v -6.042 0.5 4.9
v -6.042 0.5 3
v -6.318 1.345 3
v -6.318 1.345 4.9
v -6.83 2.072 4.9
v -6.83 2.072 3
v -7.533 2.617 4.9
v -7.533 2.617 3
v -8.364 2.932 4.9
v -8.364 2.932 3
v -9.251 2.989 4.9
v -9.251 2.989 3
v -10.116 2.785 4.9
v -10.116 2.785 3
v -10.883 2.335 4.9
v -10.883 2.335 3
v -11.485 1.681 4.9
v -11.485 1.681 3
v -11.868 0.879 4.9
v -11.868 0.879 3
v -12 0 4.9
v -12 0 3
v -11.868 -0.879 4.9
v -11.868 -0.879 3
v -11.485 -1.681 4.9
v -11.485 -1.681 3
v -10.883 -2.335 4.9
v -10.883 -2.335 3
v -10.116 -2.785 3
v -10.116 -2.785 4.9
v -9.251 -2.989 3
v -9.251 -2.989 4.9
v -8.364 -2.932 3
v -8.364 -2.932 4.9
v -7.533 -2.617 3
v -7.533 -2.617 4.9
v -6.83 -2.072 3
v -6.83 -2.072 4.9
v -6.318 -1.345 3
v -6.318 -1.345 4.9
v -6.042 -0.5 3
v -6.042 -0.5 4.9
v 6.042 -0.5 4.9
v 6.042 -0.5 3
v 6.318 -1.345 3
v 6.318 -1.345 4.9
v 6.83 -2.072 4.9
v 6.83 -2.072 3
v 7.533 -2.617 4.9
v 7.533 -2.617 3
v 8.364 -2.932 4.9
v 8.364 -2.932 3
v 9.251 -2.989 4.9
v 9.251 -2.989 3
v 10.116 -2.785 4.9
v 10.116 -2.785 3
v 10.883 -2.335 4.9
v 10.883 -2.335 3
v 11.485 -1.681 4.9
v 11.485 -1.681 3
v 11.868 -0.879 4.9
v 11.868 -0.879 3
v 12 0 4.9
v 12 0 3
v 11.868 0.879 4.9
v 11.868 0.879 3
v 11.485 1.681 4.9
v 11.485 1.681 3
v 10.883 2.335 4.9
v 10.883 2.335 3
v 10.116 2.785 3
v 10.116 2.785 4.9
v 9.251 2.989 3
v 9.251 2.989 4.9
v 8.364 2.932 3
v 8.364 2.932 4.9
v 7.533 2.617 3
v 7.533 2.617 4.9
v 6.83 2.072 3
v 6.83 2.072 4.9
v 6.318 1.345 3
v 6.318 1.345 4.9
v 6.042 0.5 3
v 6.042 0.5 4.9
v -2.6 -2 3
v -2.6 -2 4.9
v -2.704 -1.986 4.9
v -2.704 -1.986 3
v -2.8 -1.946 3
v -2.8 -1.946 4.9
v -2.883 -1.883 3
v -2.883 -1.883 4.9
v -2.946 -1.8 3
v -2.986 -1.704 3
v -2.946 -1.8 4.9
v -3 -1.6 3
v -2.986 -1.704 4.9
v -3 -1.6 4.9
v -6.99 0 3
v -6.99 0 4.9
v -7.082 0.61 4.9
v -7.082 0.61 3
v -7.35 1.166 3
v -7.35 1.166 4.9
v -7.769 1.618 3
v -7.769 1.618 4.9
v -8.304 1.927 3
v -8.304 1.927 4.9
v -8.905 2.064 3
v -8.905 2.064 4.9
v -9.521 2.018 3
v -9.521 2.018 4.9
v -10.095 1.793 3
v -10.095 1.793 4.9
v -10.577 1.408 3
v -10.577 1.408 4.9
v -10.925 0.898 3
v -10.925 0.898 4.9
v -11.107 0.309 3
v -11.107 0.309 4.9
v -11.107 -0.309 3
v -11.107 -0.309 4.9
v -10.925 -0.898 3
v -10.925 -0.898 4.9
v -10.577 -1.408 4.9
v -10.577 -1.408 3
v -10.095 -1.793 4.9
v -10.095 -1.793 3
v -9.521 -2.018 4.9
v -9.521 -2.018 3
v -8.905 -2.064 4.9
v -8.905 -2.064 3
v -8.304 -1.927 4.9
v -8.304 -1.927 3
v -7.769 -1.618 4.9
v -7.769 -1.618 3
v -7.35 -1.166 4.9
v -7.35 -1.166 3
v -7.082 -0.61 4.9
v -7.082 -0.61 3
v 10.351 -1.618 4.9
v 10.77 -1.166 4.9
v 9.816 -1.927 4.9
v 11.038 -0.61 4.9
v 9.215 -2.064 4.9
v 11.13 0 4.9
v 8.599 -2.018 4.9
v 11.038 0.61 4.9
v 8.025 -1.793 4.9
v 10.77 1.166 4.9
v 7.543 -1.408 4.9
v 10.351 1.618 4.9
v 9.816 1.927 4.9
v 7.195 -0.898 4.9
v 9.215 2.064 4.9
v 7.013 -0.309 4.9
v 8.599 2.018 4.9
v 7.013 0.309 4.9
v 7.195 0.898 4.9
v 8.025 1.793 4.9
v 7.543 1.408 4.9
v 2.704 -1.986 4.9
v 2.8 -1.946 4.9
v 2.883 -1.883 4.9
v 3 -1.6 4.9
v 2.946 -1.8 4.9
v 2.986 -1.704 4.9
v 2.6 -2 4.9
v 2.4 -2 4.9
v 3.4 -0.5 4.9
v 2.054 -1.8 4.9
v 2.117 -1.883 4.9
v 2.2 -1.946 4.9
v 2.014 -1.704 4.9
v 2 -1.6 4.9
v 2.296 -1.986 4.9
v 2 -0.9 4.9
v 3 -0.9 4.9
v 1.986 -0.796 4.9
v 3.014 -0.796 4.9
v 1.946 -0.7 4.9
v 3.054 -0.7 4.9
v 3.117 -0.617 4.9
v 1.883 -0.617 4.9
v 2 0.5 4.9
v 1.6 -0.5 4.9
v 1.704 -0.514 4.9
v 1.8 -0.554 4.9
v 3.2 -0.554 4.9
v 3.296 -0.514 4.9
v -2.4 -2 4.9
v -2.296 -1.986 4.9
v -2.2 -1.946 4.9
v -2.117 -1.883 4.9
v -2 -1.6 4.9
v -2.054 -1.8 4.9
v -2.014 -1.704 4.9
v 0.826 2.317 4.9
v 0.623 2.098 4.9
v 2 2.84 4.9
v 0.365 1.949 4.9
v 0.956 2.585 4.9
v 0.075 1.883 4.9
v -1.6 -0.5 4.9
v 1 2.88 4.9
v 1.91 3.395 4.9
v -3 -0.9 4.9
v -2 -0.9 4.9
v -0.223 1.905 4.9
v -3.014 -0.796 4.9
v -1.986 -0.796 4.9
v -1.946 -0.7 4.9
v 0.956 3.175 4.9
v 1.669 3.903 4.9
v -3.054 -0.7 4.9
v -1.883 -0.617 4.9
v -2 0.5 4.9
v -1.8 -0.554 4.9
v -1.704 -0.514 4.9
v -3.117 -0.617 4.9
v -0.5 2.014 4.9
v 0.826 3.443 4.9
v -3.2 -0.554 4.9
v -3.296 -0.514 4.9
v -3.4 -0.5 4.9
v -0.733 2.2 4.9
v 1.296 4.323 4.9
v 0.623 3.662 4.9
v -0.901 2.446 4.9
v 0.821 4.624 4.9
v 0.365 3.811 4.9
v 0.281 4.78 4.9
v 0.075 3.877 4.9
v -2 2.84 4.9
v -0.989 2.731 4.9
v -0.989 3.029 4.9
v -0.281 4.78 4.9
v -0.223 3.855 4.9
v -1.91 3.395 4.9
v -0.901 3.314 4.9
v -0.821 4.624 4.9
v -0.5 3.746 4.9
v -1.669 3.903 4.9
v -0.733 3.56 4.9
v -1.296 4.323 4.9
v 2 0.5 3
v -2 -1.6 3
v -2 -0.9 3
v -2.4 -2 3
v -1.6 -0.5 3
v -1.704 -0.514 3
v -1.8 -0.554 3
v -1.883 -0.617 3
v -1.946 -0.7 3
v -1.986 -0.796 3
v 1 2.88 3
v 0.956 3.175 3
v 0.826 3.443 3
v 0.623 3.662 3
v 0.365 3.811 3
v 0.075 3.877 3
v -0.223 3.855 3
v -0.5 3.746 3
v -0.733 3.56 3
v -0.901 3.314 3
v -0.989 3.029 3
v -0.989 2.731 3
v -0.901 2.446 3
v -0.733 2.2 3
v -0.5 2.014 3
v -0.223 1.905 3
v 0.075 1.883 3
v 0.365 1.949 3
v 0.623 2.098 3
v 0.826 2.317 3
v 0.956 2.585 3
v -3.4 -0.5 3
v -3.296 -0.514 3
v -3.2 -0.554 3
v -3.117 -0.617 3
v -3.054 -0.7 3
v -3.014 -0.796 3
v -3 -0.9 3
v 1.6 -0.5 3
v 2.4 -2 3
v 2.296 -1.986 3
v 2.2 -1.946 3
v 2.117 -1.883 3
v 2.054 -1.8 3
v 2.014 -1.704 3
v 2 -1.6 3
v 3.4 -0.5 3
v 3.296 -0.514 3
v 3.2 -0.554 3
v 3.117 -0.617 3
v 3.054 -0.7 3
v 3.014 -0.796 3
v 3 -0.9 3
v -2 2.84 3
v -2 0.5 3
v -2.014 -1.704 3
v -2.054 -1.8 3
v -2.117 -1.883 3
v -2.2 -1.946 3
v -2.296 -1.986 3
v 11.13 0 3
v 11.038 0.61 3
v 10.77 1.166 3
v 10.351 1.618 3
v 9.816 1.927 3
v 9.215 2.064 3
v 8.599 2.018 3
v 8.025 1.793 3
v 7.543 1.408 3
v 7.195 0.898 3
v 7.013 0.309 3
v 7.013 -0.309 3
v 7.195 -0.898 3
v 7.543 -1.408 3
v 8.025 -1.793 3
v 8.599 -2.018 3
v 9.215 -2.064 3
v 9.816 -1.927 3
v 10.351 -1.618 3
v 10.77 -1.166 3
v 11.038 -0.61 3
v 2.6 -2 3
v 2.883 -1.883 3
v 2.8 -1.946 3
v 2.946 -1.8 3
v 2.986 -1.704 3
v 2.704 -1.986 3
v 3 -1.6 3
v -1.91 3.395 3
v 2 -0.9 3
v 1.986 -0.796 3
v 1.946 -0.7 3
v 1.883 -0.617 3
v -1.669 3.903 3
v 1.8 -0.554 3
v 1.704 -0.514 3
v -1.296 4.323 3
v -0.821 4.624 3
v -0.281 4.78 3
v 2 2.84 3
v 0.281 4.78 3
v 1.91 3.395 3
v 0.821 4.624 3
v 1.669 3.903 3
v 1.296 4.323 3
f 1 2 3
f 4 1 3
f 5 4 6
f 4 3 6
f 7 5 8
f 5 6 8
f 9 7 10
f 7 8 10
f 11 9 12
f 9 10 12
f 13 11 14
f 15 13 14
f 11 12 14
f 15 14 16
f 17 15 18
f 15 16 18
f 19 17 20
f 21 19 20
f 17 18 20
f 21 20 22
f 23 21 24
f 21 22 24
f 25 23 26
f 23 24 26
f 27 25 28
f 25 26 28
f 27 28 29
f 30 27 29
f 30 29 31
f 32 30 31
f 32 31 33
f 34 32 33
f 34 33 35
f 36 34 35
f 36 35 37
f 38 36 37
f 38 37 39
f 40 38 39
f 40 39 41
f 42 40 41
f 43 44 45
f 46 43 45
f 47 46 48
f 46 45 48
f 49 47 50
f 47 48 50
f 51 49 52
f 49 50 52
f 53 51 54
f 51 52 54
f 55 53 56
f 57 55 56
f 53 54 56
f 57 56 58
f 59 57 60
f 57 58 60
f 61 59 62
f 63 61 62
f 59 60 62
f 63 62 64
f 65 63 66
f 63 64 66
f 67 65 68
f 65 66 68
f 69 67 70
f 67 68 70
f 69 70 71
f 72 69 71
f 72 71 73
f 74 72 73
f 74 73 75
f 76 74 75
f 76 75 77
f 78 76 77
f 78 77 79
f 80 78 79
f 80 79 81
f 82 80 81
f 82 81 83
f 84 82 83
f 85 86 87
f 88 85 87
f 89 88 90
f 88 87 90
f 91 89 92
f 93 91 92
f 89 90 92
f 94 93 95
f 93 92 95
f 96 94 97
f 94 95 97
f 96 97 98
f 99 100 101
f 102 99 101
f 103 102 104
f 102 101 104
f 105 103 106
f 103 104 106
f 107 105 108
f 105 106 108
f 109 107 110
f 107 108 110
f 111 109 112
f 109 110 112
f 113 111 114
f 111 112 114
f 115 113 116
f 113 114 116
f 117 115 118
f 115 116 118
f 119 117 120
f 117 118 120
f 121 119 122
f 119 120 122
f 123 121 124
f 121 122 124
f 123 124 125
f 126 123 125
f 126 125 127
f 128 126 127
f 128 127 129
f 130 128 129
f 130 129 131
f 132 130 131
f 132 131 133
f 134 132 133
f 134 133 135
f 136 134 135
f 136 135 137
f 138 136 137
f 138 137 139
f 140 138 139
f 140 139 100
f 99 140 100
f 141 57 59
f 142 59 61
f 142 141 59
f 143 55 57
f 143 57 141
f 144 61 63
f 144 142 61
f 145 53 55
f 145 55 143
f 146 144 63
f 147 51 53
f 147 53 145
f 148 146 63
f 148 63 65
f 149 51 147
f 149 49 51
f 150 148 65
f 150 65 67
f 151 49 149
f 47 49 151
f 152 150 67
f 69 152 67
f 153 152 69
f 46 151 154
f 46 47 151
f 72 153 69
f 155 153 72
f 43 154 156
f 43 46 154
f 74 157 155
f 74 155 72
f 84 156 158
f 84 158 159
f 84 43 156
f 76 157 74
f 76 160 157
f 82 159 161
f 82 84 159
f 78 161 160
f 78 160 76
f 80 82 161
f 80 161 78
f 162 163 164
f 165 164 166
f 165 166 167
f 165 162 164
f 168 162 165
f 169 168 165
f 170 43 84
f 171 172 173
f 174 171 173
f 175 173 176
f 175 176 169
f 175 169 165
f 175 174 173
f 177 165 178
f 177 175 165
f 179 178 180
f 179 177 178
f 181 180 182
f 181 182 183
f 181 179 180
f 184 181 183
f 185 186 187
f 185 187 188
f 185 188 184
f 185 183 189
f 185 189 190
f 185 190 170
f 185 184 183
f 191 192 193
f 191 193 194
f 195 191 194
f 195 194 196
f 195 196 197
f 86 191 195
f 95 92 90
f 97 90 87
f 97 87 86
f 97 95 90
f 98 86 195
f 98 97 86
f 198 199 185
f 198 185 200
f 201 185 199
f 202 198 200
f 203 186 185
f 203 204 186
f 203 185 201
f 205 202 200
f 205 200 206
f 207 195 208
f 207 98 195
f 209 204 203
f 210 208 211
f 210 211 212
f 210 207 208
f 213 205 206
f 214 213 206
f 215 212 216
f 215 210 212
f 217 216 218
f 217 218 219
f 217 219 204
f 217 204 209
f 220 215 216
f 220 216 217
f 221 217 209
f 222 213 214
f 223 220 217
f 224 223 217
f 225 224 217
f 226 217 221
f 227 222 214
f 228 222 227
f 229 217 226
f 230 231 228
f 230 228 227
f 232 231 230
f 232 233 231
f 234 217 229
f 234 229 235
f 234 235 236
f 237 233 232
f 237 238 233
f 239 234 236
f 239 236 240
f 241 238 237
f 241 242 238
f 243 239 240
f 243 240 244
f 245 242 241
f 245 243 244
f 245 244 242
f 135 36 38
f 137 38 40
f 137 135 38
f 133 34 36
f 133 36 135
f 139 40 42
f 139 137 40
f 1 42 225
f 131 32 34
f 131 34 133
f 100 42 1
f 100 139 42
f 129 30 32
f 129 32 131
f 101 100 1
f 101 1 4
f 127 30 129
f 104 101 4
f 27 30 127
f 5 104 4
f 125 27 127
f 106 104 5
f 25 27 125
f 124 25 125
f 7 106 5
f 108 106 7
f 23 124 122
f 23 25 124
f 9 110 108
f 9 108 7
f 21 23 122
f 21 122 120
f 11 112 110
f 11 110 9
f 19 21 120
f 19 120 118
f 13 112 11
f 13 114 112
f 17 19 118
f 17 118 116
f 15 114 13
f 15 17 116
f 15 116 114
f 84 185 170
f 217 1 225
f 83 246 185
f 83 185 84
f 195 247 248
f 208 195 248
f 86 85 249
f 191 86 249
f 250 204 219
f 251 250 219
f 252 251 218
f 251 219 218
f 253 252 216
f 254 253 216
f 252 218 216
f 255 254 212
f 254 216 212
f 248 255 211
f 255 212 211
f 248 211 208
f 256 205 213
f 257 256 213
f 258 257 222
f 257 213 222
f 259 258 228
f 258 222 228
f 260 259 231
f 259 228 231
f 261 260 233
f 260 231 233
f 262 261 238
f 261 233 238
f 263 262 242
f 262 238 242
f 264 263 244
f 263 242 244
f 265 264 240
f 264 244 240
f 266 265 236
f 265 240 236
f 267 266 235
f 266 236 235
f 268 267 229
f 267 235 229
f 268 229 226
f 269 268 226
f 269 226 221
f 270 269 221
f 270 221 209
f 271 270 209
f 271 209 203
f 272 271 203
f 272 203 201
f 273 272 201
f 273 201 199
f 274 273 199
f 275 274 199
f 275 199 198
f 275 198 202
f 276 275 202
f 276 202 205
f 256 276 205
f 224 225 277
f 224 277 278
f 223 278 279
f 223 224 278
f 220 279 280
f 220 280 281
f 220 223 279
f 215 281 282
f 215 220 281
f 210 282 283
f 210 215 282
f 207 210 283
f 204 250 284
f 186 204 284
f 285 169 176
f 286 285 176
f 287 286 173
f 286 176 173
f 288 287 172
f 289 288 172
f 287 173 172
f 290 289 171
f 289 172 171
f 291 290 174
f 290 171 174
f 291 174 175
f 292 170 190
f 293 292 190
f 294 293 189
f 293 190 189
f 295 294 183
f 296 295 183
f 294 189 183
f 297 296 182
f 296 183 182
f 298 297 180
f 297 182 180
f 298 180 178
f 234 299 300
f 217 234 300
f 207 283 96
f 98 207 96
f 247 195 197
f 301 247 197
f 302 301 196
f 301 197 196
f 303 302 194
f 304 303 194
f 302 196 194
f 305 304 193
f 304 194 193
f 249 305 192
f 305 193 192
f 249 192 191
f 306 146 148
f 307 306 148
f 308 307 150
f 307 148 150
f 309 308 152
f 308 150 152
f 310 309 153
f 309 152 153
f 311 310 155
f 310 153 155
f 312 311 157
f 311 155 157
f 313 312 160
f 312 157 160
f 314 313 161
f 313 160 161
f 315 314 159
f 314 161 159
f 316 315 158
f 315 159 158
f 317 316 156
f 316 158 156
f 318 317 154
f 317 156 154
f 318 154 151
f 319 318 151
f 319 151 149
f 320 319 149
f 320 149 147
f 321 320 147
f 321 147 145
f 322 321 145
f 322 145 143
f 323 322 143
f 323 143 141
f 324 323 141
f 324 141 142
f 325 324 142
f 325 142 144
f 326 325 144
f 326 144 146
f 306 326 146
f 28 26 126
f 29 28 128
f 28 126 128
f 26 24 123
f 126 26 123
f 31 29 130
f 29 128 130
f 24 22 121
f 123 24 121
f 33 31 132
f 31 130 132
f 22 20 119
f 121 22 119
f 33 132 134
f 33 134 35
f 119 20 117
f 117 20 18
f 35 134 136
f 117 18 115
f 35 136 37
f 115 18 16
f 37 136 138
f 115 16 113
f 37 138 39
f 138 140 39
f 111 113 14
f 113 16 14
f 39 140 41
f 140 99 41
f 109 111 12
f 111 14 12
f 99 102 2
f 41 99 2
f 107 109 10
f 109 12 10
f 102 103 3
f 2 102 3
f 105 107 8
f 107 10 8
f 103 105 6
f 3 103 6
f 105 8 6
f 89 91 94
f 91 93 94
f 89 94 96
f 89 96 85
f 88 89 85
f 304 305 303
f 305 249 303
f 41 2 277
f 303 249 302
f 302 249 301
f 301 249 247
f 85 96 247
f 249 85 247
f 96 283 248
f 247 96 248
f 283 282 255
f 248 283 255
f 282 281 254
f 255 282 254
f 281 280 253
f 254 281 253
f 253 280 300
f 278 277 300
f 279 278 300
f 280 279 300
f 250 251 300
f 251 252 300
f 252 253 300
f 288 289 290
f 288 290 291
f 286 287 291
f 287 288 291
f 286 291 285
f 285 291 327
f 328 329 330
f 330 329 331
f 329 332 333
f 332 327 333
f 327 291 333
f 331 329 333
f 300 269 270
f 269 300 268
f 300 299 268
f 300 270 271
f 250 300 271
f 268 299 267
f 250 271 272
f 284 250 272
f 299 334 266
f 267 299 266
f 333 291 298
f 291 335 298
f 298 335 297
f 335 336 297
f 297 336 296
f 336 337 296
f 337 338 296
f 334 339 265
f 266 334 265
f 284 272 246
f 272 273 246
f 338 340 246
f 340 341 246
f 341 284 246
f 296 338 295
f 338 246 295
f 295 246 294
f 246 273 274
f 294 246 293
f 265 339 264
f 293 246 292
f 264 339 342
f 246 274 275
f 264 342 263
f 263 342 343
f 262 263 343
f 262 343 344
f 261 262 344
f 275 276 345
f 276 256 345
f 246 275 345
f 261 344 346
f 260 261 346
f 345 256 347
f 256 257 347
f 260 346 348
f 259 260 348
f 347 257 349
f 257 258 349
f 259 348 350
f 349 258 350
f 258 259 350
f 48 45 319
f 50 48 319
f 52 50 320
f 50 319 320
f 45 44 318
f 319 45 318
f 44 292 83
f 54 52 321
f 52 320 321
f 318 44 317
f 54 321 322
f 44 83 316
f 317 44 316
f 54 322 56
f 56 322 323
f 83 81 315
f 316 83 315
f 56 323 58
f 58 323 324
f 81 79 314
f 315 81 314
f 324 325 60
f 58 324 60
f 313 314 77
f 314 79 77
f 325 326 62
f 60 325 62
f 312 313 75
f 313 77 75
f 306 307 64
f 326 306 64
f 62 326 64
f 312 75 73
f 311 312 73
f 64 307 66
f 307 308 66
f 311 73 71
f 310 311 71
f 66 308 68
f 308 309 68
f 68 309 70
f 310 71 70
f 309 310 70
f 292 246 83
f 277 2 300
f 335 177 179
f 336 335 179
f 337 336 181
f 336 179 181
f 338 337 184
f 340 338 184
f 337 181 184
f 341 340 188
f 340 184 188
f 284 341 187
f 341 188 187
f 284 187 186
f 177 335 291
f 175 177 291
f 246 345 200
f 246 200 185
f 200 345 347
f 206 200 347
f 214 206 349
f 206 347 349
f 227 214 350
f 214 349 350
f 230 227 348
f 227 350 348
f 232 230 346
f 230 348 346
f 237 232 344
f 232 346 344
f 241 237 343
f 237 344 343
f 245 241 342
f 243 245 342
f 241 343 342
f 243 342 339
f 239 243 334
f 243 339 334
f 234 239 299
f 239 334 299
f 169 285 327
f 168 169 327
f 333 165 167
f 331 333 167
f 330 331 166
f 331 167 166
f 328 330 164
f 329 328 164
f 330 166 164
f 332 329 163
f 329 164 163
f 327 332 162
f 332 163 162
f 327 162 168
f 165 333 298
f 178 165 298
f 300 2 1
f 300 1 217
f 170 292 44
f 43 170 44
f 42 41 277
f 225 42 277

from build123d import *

# Parameters (mm, degrees)
PAD001_DEPTH        = 2
SKETCH008_R         = 1
POCKET006_DEPTH     = 5
SKETCH010_R         = 2.07
POCKET007_DEPTH     = 2
FILLET002_R         = 0.4
FILLET002_FACE5_R   = 2.07
FILLET002_FACE5_R_2 = 1
POCKET011_DEPTH     = 0.1


with BuildPart() as part:
    # Sketch007 → Pad001 (new body)
    with BuildSketch(Plane.XY):
        with BuildLine():
            ThreePointArc((6.0419601085, -0.5), (12, 0), (6.0419601085, 0.5))
            Line((1.99959996, 0.5), (6.0419601085, 0.5))
            Line((1.99959996, 2.84), (1.99959996, 0.5))
            ThreePointArc((1.99959996, 2.84), (0, 4.8), (-1.99959996, 2.84))
            Line((-1.99959996, 2.84), (-1.99959996, 0.5))
            Line((-6.0419601085, 0.5), (-1.99959996, 0.5))
            ThreePointArc((-6.0419601085, 0.5), (-12, 0), (-6.0419601085, -0.5))
            Line((-6.0419601085, -0.5), (-3, -0.5))
            Line((-3, -0.5), (-3, -2))
            Line((-3, -2), (-2, -2))
            Line((-2, -2), (-2, -0.5))
            Line((-2, -0.5), (2, -0.5))
            Line((2, -0.5), (2, -2))
            Line((2, -2), (3, -2))
            Line((3, -2), (3, -0.5))
            Line((3, -0.5), (6.0419601085, -0.5))
        make_face()
    extrude(amount=PAD001_DEPTH)

    # Sketch008 (on Face18 of Pad001) → Pocket006 (cut)
    with BuildSketch(Plane.XY.offset(2)):
        with Locations((0, 2.88)):
            Circle(SKETCH008_R)
    extrude(amount=-POCKET006_DEPTH, mode=Mode.SUBTRACT)

    # Sketch010 (on Face5 of Pocket006) → Pocket007 (cut)
    with BuildSketch(Plane.XY.offset(2)):
        with Locations((-9.06, 0)):
            Circle(SKETCH010_R)
        with Locations((9.06, 0)):
            Circle(SKETCH010_R)
    extrude(amount=-POCKET007_DEPTH, mode=Mode.SUBTRACT)

    # Fillet002
    fillet002_edges = [part.edges().sort_by_distance(p)[0] for p in [
        (-3, -2, 1),
        (-2, -2, 1),
        (-3, -0.5, 1),
        (-2, -0.5, 1),
        (2, -0.5, 1),
        (2, -2, 1),
        (3, -2, 1),
        (3, -0.5, 1),
    ]]
    fillet(fillet002_edges, radius=FILLET002_R)

    # Fillet002 Face5 → Pocket011 (cut)
    with BuildSketch(Plane(origin=(0, 0.4471888212, 2), x_dir=(0, 1, 0), z_dir=(0, 0, 1))):
        with BuildLine():
            Line((-0.9471888212, 6.0419601085), (-0.9471888212, 3.4))
            ThreePointArc((-0.9471888212, 3.4), (-1.0643461087, 3.1171572875), (-1.3471888212, 3))
            Line((-1.3471888212, 3), (-2.0471888212, 3))
            ThreePointArc((-2.0471888212, 3), (-2.3300315337, 2.8828427125), (-2.4471888212, 2.6))
            Line((-2.4471888212, 2.6), (-2.4471888212, 2.4))
            ThreePointArc((-2.4471888212, 2.4), (-2.3300315337, 2.1171572875), (-2.0471888212, 2))
            Line((-2.0471888212, 2), (-1.3471888212, 2))
            ThreePointArc((-1.3471888212, 2), (-1.0643461087, 1.8828427125), (-0.9471888212, 1.6))
            Line((-0.9471888212, 1.6), (-0.9471888212, -1.6))
            ThreePointArc((-0.9471888212, -1.6), (-1.0643461087, -1.8828427125), (-1.3471888212, -2))
            Line((-1.3471888212, -2), (-2.0471888212, -2))
            ThreePointArc((-2.0471888212, -2), (-2.3300315337, -2.1171572875), (-2.4471888212, -2.4))
            Line((-2.4471888212, -2.4), (-2.4471888212, -2.6))
            ThreePointArc((-2.4471888212, -2.6), (-2.3300315337, -2.8828427125), (-2.0471888212, -3))
            Line((-2.0471888212, -3), (-1.3471888212, -3))
            ThreePointArc((-1.3471888212, -3), (-1.0643461087, -3.1171572875), (-0.9471888212, -3.4))
            Line((-0.9471888212, -3.4), (-0.9471888212, -6.0419601085))
            ThreePointArc((-0.9471888212, -6.0419601085), (-0.4471888212, -12), (0.0528111788, -6.0419601085))
            Line((0.0528111788, -6.0419601085), (0.0528111788, -1.99959996))
            Line((0.0528111788, -1.99959996), (2.3928111788, -1.99959996))
            ThreePointArc((2.3928111788, -1.99959996), (4.3528111788, 0), (2.3928111788, 1.99959996))
            Line((2.3928111788, 1.99959996), (0.0528111788, 1.99959996))
            Line((0.0528111788, 1.99959996), (0.0528111788, 6.0419601085))
            ThreePointArc((0.0528111788, 6.0419601085), (-0.4471888212, 12), (-0.9471888212, 6.0419601085))
        make_face()
        with Locations((-0.4471888212, 9.06)):
            Circle(FILLET002_FACE5_R, mode=Mode.SUBTRACT)
        with Locations((-0.4471888212, -9.06)):
            Circle(FILLET002_FACE5_R, mode=Mode.SUBTRACT)
        with Locations((2.4328111788, 0)):
            Circle(FILLET002_FACE5_R_2, mode=Mode.SUBTRACT)
    extrude(amount=-POCKET011_DEPTH, mode=Mode.SUBTRACT)


with BuildPart() as part_1:
    # Body001 placement: moved
    add(part.part.moved(Location((0, 0, 3))))


solid = part_1.part
